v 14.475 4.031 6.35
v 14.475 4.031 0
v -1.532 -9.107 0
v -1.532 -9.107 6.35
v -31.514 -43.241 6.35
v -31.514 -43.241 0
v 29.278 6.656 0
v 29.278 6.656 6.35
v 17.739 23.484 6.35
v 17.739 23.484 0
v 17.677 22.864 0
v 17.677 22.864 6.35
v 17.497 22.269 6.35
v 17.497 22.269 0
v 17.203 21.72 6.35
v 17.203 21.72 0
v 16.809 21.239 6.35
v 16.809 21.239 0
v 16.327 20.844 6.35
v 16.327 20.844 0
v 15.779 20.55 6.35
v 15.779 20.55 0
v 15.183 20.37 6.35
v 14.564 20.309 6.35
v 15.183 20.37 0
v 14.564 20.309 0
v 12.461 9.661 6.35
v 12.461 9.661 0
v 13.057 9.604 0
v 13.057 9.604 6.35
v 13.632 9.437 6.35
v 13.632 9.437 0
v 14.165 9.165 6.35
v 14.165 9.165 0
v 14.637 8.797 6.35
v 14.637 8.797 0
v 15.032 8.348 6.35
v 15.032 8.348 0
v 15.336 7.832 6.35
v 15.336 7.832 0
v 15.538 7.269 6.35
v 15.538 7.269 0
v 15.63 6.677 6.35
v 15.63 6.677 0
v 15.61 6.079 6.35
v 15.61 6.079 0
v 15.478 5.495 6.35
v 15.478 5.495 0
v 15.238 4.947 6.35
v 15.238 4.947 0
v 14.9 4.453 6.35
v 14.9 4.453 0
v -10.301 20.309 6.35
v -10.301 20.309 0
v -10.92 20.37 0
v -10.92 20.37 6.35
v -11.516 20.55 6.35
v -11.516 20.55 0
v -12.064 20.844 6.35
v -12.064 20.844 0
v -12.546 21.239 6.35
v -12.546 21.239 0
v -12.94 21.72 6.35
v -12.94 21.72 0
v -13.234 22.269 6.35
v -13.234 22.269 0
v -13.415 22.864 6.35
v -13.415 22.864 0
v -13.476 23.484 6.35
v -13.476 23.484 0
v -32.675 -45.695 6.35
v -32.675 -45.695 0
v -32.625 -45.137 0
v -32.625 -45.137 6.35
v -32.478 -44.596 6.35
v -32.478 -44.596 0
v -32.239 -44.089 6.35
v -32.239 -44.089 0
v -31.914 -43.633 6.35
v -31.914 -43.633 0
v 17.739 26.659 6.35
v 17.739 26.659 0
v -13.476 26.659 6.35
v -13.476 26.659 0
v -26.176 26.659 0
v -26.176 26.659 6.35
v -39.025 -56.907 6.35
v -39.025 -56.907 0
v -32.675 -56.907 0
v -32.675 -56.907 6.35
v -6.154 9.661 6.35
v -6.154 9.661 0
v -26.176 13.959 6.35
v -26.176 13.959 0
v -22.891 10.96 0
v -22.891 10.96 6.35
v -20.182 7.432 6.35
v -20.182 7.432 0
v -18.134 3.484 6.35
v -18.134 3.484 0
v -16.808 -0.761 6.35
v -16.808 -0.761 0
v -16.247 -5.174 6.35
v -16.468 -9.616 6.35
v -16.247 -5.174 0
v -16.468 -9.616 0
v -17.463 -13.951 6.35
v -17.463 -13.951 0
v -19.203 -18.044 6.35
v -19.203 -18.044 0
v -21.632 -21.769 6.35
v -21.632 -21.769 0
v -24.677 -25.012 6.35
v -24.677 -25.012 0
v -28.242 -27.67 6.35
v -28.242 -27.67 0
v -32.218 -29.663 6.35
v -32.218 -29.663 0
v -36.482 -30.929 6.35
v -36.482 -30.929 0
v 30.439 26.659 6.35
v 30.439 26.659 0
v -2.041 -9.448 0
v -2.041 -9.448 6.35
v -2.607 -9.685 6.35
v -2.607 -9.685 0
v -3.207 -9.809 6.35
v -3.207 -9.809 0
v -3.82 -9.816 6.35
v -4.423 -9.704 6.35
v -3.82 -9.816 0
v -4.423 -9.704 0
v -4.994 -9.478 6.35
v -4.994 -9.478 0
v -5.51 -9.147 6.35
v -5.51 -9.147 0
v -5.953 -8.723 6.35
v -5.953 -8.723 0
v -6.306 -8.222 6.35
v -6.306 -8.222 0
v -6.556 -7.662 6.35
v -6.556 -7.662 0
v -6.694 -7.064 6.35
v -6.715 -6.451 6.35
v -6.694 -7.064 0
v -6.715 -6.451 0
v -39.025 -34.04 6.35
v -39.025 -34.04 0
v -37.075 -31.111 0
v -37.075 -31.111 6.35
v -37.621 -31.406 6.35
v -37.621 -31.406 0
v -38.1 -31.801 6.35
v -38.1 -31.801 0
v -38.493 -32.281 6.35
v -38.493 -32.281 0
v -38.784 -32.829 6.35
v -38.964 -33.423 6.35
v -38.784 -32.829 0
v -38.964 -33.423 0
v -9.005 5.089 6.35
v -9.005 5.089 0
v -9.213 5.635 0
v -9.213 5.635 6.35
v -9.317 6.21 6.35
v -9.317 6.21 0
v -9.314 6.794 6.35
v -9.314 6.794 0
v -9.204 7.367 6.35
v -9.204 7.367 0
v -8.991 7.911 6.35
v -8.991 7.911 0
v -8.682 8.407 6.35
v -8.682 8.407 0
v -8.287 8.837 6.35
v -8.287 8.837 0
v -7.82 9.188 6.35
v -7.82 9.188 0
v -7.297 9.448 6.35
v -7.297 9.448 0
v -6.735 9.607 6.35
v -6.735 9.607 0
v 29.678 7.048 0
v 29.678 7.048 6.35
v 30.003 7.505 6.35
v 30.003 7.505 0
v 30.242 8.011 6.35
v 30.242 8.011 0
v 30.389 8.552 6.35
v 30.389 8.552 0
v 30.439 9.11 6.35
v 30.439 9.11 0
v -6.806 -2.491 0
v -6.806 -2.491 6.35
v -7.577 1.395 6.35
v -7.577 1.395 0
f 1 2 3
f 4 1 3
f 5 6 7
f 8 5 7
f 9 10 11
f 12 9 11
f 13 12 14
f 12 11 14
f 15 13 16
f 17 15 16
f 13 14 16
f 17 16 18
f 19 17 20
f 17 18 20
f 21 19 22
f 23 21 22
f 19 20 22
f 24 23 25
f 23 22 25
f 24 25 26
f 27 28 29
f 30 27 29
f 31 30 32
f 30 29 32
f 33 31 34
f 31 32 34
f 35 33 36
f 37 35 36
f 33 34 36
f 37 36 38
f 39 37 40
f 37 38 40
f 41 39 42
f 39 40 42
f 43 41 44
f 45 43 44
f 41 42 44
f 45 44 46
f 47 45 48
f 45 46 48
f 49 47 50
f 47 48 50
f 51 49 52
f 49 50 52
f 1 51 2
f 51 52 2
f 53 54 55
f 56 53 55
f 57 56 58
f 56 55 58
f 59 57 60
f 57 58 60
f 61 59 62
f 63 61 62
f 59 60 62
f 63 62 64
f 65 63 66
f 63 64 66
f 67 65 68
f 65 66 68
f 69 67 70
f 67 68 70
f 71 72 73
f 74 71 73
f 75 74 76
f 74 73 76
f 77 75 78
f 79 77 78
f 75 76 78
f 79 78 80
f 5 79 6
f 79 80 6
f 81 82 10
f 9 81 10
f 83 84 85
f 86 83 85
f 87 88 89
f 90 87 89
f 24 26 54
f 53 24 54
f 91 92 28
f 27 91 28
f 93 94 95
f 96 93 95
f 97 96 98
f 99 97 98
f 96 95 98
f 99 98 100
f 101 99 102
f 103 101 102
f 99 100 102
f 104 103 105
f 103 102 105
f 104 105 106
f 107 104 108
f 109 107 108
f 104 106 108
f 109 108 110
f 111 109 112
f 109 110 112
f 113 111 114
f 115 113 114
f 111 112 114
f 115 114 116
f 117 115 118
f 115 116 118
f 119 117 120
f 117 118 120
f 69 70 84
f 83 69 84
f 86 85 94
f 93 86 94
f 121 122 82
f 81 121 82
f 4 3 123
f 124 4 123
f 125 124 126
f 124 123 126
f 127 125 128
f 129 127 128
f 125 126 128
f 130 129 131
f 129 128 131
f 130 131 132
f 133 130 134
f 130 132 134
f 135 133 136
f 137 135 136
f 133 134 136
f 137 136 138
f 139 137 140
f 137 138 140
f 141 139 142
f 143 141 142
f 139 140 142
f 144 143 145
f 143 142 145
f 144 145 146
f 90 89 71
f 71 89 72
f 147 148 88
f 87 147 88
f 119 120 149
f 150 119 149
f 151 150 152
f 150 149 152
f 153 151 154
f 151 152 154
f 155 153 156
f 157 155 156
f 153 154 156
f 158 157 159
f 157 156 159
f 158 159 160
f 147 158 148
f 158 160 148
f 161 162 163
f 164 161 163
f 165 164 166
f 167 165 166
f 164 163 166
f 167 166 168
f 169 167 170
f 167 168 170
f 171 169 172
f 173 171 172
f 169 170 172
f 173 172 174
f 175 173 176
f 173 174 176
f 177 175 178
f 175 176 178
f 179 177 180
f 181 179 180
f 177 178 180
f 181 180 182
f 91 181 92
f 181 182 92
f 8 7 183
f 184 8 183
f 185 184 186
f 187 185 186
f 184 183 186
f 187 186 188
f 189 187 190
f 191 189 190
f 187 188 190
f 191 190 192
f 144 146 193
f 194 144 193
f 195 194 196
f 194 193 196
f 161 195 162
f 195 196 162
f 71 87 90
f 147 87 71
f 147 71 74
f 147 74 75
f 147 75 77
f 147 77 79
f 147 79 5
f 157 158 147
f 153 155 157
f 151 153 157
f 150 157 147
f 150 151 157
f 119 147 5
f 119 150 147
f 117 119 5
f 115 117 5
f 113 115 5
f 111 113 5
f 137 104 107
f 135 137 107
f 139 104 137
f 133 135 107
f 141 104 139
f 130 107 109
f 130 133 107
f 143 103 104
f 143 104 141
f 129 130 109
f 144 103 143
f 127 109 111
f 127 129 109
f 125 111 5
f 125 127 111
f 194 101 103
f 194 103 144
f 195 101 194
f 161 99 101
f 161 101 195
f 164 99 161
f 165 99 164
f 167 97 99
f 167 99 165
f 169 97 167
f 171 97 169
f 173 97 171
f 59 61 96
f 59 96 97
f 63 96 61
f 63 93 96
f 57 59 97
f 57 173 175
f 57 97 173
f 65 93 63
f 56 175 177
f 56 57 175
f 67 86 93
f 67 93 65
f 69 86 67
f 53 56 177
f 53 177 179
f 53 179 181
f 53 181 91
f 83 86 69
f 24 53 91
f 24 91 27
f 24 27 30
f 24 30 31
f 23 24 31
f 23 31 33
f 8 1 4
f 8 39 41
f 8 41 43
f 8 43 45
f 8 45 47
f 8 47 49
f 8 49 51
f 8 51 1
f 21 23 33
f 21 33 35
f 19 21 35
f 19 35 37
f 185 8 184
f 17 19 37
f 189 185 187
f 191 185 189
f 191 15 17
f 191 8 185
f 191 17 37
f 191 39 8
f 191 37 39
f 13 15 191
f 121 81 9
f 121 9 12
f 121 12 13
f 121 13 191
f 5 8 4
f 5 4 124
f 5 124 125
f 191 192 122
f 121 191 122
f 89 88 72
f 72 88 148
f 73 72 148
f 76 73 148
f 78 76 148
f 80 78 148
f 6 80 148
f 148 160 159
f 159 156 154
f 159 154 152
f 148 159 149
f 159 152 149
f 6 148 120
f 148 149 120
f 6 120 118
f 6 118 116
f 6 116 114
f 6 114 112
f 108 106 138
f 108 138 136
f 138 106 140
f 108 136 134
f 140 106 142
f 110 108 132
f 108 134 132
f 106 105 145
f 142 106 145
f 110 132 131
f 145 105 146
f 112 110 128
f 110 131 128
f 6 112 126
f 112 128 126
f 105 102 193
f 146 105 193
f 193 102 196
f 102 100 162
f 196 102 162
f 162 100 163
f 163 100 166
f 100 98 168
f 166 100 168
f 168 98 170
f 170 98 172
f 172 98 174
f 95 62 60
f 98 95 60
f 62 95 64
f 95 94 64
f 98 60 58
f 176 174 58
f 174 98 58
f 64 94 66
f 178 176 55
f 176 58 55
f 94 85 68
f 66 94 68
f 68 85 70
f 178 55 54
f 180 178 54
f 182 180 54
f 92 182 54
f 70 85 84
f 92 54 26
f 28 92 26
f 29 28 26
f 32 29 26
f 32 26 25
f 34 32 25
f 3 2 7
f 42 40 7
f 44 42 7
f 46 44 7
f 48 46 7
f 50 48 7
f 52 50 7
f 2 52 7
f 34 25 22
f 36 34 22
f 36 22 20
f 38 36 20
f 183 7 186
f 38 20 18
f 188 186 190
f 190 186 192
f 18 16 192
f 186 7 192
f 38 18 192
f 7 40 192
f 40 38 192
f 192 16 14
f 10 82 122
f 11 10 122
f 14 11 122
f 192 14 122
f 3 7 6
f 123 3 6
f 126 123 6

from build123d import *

# Parameters (mm, degrees)
F1_DEPTH = 6.35


with BuildPart() as f1:
    # F0 (on Top) → F1 (new body)
    with BuildSketch(Plane.XY):
        with BuildLine():
            Line((-13.475527, 26.65859), (-26.175527, 26.65859))
            Line((-26.175527, 26.65859), (-26.175527, 13.95859))
            ThreePointArc((-26.175527, 13.95859), (-16.870071, -11.805035), (-36.482046, -30.929006))
            ThreePointArc((-36.482046, -30.929006), (-38.308198, -32.031301), (-39.024714, -34.040402))
            Line((-39.024714, -34.040402), (-39.024714, -44.193178))
            Line((-39.024714, -44.193178), (-39.024714, -56.90741))
            Line((-39.024714, -56.90741), (-32.674714, -56.90741))
            Line((-32.674714, -56.90741), (-32.674714, -45.69473))
            ThreePointArc((-32.674714, -45.69473), (-32.369919, -44.337325), (-31.514054, -43.240538))
            Line((-31.514054, -43.240538), (29.277846, 6.655949))
            ThreePointArc((29.277846, 6.655949), (30.133711, 7.752736), (30.438506, 9.110141))
            Line((30.438506, 9.110141), (30.438506, 26.65859))
            Line((30.438506, 26.65859), (17.738506, 26.65859))
            Line((17.738506, 26.65859), (17.738506, 23.48359))
            ThreePointArc((17.738506, 23.48359), (16.80857, 21.238526), (14.563506, 20.30859))
            Line((14.563506, 20.30859), (-10.300527, 20.30859))
            ThreePointArc((-10.300527, 20.30859), (-12.545591, 21.238526), (-13.475527, 23.48359))
            Line((-13.475527, 23.48359), (-13.475527, 26.65859))
        make_face()
        with BuildLine():
            ThreePointArc((-1.531554, -9.106644), (-4.993641, -9.478165), (-6.714508, -6.451172))
            ThreePointArc((-6.714508, -6.451172), (-7.107301, -0.531525), (-9.005287, 5.089344))
            ThreePointArc((-9.005287, 5.089344), (-8.847646, 8.166009), (-6.153785, 9.66061))
            Line((-6.153785, 9.66061), (12.460999, 9.66061))
            ThreePointArc((12.460999, 9.66061), (15.450371, 7.555321), (14.475339, 4.031418))
            Line((14.475339, 4.031418), (-1.531554, -9.106644))
        make_face(mode=Mode.SUBTRACT)
    extrude(amount=F1_DEPTH)


solid = f1.part
